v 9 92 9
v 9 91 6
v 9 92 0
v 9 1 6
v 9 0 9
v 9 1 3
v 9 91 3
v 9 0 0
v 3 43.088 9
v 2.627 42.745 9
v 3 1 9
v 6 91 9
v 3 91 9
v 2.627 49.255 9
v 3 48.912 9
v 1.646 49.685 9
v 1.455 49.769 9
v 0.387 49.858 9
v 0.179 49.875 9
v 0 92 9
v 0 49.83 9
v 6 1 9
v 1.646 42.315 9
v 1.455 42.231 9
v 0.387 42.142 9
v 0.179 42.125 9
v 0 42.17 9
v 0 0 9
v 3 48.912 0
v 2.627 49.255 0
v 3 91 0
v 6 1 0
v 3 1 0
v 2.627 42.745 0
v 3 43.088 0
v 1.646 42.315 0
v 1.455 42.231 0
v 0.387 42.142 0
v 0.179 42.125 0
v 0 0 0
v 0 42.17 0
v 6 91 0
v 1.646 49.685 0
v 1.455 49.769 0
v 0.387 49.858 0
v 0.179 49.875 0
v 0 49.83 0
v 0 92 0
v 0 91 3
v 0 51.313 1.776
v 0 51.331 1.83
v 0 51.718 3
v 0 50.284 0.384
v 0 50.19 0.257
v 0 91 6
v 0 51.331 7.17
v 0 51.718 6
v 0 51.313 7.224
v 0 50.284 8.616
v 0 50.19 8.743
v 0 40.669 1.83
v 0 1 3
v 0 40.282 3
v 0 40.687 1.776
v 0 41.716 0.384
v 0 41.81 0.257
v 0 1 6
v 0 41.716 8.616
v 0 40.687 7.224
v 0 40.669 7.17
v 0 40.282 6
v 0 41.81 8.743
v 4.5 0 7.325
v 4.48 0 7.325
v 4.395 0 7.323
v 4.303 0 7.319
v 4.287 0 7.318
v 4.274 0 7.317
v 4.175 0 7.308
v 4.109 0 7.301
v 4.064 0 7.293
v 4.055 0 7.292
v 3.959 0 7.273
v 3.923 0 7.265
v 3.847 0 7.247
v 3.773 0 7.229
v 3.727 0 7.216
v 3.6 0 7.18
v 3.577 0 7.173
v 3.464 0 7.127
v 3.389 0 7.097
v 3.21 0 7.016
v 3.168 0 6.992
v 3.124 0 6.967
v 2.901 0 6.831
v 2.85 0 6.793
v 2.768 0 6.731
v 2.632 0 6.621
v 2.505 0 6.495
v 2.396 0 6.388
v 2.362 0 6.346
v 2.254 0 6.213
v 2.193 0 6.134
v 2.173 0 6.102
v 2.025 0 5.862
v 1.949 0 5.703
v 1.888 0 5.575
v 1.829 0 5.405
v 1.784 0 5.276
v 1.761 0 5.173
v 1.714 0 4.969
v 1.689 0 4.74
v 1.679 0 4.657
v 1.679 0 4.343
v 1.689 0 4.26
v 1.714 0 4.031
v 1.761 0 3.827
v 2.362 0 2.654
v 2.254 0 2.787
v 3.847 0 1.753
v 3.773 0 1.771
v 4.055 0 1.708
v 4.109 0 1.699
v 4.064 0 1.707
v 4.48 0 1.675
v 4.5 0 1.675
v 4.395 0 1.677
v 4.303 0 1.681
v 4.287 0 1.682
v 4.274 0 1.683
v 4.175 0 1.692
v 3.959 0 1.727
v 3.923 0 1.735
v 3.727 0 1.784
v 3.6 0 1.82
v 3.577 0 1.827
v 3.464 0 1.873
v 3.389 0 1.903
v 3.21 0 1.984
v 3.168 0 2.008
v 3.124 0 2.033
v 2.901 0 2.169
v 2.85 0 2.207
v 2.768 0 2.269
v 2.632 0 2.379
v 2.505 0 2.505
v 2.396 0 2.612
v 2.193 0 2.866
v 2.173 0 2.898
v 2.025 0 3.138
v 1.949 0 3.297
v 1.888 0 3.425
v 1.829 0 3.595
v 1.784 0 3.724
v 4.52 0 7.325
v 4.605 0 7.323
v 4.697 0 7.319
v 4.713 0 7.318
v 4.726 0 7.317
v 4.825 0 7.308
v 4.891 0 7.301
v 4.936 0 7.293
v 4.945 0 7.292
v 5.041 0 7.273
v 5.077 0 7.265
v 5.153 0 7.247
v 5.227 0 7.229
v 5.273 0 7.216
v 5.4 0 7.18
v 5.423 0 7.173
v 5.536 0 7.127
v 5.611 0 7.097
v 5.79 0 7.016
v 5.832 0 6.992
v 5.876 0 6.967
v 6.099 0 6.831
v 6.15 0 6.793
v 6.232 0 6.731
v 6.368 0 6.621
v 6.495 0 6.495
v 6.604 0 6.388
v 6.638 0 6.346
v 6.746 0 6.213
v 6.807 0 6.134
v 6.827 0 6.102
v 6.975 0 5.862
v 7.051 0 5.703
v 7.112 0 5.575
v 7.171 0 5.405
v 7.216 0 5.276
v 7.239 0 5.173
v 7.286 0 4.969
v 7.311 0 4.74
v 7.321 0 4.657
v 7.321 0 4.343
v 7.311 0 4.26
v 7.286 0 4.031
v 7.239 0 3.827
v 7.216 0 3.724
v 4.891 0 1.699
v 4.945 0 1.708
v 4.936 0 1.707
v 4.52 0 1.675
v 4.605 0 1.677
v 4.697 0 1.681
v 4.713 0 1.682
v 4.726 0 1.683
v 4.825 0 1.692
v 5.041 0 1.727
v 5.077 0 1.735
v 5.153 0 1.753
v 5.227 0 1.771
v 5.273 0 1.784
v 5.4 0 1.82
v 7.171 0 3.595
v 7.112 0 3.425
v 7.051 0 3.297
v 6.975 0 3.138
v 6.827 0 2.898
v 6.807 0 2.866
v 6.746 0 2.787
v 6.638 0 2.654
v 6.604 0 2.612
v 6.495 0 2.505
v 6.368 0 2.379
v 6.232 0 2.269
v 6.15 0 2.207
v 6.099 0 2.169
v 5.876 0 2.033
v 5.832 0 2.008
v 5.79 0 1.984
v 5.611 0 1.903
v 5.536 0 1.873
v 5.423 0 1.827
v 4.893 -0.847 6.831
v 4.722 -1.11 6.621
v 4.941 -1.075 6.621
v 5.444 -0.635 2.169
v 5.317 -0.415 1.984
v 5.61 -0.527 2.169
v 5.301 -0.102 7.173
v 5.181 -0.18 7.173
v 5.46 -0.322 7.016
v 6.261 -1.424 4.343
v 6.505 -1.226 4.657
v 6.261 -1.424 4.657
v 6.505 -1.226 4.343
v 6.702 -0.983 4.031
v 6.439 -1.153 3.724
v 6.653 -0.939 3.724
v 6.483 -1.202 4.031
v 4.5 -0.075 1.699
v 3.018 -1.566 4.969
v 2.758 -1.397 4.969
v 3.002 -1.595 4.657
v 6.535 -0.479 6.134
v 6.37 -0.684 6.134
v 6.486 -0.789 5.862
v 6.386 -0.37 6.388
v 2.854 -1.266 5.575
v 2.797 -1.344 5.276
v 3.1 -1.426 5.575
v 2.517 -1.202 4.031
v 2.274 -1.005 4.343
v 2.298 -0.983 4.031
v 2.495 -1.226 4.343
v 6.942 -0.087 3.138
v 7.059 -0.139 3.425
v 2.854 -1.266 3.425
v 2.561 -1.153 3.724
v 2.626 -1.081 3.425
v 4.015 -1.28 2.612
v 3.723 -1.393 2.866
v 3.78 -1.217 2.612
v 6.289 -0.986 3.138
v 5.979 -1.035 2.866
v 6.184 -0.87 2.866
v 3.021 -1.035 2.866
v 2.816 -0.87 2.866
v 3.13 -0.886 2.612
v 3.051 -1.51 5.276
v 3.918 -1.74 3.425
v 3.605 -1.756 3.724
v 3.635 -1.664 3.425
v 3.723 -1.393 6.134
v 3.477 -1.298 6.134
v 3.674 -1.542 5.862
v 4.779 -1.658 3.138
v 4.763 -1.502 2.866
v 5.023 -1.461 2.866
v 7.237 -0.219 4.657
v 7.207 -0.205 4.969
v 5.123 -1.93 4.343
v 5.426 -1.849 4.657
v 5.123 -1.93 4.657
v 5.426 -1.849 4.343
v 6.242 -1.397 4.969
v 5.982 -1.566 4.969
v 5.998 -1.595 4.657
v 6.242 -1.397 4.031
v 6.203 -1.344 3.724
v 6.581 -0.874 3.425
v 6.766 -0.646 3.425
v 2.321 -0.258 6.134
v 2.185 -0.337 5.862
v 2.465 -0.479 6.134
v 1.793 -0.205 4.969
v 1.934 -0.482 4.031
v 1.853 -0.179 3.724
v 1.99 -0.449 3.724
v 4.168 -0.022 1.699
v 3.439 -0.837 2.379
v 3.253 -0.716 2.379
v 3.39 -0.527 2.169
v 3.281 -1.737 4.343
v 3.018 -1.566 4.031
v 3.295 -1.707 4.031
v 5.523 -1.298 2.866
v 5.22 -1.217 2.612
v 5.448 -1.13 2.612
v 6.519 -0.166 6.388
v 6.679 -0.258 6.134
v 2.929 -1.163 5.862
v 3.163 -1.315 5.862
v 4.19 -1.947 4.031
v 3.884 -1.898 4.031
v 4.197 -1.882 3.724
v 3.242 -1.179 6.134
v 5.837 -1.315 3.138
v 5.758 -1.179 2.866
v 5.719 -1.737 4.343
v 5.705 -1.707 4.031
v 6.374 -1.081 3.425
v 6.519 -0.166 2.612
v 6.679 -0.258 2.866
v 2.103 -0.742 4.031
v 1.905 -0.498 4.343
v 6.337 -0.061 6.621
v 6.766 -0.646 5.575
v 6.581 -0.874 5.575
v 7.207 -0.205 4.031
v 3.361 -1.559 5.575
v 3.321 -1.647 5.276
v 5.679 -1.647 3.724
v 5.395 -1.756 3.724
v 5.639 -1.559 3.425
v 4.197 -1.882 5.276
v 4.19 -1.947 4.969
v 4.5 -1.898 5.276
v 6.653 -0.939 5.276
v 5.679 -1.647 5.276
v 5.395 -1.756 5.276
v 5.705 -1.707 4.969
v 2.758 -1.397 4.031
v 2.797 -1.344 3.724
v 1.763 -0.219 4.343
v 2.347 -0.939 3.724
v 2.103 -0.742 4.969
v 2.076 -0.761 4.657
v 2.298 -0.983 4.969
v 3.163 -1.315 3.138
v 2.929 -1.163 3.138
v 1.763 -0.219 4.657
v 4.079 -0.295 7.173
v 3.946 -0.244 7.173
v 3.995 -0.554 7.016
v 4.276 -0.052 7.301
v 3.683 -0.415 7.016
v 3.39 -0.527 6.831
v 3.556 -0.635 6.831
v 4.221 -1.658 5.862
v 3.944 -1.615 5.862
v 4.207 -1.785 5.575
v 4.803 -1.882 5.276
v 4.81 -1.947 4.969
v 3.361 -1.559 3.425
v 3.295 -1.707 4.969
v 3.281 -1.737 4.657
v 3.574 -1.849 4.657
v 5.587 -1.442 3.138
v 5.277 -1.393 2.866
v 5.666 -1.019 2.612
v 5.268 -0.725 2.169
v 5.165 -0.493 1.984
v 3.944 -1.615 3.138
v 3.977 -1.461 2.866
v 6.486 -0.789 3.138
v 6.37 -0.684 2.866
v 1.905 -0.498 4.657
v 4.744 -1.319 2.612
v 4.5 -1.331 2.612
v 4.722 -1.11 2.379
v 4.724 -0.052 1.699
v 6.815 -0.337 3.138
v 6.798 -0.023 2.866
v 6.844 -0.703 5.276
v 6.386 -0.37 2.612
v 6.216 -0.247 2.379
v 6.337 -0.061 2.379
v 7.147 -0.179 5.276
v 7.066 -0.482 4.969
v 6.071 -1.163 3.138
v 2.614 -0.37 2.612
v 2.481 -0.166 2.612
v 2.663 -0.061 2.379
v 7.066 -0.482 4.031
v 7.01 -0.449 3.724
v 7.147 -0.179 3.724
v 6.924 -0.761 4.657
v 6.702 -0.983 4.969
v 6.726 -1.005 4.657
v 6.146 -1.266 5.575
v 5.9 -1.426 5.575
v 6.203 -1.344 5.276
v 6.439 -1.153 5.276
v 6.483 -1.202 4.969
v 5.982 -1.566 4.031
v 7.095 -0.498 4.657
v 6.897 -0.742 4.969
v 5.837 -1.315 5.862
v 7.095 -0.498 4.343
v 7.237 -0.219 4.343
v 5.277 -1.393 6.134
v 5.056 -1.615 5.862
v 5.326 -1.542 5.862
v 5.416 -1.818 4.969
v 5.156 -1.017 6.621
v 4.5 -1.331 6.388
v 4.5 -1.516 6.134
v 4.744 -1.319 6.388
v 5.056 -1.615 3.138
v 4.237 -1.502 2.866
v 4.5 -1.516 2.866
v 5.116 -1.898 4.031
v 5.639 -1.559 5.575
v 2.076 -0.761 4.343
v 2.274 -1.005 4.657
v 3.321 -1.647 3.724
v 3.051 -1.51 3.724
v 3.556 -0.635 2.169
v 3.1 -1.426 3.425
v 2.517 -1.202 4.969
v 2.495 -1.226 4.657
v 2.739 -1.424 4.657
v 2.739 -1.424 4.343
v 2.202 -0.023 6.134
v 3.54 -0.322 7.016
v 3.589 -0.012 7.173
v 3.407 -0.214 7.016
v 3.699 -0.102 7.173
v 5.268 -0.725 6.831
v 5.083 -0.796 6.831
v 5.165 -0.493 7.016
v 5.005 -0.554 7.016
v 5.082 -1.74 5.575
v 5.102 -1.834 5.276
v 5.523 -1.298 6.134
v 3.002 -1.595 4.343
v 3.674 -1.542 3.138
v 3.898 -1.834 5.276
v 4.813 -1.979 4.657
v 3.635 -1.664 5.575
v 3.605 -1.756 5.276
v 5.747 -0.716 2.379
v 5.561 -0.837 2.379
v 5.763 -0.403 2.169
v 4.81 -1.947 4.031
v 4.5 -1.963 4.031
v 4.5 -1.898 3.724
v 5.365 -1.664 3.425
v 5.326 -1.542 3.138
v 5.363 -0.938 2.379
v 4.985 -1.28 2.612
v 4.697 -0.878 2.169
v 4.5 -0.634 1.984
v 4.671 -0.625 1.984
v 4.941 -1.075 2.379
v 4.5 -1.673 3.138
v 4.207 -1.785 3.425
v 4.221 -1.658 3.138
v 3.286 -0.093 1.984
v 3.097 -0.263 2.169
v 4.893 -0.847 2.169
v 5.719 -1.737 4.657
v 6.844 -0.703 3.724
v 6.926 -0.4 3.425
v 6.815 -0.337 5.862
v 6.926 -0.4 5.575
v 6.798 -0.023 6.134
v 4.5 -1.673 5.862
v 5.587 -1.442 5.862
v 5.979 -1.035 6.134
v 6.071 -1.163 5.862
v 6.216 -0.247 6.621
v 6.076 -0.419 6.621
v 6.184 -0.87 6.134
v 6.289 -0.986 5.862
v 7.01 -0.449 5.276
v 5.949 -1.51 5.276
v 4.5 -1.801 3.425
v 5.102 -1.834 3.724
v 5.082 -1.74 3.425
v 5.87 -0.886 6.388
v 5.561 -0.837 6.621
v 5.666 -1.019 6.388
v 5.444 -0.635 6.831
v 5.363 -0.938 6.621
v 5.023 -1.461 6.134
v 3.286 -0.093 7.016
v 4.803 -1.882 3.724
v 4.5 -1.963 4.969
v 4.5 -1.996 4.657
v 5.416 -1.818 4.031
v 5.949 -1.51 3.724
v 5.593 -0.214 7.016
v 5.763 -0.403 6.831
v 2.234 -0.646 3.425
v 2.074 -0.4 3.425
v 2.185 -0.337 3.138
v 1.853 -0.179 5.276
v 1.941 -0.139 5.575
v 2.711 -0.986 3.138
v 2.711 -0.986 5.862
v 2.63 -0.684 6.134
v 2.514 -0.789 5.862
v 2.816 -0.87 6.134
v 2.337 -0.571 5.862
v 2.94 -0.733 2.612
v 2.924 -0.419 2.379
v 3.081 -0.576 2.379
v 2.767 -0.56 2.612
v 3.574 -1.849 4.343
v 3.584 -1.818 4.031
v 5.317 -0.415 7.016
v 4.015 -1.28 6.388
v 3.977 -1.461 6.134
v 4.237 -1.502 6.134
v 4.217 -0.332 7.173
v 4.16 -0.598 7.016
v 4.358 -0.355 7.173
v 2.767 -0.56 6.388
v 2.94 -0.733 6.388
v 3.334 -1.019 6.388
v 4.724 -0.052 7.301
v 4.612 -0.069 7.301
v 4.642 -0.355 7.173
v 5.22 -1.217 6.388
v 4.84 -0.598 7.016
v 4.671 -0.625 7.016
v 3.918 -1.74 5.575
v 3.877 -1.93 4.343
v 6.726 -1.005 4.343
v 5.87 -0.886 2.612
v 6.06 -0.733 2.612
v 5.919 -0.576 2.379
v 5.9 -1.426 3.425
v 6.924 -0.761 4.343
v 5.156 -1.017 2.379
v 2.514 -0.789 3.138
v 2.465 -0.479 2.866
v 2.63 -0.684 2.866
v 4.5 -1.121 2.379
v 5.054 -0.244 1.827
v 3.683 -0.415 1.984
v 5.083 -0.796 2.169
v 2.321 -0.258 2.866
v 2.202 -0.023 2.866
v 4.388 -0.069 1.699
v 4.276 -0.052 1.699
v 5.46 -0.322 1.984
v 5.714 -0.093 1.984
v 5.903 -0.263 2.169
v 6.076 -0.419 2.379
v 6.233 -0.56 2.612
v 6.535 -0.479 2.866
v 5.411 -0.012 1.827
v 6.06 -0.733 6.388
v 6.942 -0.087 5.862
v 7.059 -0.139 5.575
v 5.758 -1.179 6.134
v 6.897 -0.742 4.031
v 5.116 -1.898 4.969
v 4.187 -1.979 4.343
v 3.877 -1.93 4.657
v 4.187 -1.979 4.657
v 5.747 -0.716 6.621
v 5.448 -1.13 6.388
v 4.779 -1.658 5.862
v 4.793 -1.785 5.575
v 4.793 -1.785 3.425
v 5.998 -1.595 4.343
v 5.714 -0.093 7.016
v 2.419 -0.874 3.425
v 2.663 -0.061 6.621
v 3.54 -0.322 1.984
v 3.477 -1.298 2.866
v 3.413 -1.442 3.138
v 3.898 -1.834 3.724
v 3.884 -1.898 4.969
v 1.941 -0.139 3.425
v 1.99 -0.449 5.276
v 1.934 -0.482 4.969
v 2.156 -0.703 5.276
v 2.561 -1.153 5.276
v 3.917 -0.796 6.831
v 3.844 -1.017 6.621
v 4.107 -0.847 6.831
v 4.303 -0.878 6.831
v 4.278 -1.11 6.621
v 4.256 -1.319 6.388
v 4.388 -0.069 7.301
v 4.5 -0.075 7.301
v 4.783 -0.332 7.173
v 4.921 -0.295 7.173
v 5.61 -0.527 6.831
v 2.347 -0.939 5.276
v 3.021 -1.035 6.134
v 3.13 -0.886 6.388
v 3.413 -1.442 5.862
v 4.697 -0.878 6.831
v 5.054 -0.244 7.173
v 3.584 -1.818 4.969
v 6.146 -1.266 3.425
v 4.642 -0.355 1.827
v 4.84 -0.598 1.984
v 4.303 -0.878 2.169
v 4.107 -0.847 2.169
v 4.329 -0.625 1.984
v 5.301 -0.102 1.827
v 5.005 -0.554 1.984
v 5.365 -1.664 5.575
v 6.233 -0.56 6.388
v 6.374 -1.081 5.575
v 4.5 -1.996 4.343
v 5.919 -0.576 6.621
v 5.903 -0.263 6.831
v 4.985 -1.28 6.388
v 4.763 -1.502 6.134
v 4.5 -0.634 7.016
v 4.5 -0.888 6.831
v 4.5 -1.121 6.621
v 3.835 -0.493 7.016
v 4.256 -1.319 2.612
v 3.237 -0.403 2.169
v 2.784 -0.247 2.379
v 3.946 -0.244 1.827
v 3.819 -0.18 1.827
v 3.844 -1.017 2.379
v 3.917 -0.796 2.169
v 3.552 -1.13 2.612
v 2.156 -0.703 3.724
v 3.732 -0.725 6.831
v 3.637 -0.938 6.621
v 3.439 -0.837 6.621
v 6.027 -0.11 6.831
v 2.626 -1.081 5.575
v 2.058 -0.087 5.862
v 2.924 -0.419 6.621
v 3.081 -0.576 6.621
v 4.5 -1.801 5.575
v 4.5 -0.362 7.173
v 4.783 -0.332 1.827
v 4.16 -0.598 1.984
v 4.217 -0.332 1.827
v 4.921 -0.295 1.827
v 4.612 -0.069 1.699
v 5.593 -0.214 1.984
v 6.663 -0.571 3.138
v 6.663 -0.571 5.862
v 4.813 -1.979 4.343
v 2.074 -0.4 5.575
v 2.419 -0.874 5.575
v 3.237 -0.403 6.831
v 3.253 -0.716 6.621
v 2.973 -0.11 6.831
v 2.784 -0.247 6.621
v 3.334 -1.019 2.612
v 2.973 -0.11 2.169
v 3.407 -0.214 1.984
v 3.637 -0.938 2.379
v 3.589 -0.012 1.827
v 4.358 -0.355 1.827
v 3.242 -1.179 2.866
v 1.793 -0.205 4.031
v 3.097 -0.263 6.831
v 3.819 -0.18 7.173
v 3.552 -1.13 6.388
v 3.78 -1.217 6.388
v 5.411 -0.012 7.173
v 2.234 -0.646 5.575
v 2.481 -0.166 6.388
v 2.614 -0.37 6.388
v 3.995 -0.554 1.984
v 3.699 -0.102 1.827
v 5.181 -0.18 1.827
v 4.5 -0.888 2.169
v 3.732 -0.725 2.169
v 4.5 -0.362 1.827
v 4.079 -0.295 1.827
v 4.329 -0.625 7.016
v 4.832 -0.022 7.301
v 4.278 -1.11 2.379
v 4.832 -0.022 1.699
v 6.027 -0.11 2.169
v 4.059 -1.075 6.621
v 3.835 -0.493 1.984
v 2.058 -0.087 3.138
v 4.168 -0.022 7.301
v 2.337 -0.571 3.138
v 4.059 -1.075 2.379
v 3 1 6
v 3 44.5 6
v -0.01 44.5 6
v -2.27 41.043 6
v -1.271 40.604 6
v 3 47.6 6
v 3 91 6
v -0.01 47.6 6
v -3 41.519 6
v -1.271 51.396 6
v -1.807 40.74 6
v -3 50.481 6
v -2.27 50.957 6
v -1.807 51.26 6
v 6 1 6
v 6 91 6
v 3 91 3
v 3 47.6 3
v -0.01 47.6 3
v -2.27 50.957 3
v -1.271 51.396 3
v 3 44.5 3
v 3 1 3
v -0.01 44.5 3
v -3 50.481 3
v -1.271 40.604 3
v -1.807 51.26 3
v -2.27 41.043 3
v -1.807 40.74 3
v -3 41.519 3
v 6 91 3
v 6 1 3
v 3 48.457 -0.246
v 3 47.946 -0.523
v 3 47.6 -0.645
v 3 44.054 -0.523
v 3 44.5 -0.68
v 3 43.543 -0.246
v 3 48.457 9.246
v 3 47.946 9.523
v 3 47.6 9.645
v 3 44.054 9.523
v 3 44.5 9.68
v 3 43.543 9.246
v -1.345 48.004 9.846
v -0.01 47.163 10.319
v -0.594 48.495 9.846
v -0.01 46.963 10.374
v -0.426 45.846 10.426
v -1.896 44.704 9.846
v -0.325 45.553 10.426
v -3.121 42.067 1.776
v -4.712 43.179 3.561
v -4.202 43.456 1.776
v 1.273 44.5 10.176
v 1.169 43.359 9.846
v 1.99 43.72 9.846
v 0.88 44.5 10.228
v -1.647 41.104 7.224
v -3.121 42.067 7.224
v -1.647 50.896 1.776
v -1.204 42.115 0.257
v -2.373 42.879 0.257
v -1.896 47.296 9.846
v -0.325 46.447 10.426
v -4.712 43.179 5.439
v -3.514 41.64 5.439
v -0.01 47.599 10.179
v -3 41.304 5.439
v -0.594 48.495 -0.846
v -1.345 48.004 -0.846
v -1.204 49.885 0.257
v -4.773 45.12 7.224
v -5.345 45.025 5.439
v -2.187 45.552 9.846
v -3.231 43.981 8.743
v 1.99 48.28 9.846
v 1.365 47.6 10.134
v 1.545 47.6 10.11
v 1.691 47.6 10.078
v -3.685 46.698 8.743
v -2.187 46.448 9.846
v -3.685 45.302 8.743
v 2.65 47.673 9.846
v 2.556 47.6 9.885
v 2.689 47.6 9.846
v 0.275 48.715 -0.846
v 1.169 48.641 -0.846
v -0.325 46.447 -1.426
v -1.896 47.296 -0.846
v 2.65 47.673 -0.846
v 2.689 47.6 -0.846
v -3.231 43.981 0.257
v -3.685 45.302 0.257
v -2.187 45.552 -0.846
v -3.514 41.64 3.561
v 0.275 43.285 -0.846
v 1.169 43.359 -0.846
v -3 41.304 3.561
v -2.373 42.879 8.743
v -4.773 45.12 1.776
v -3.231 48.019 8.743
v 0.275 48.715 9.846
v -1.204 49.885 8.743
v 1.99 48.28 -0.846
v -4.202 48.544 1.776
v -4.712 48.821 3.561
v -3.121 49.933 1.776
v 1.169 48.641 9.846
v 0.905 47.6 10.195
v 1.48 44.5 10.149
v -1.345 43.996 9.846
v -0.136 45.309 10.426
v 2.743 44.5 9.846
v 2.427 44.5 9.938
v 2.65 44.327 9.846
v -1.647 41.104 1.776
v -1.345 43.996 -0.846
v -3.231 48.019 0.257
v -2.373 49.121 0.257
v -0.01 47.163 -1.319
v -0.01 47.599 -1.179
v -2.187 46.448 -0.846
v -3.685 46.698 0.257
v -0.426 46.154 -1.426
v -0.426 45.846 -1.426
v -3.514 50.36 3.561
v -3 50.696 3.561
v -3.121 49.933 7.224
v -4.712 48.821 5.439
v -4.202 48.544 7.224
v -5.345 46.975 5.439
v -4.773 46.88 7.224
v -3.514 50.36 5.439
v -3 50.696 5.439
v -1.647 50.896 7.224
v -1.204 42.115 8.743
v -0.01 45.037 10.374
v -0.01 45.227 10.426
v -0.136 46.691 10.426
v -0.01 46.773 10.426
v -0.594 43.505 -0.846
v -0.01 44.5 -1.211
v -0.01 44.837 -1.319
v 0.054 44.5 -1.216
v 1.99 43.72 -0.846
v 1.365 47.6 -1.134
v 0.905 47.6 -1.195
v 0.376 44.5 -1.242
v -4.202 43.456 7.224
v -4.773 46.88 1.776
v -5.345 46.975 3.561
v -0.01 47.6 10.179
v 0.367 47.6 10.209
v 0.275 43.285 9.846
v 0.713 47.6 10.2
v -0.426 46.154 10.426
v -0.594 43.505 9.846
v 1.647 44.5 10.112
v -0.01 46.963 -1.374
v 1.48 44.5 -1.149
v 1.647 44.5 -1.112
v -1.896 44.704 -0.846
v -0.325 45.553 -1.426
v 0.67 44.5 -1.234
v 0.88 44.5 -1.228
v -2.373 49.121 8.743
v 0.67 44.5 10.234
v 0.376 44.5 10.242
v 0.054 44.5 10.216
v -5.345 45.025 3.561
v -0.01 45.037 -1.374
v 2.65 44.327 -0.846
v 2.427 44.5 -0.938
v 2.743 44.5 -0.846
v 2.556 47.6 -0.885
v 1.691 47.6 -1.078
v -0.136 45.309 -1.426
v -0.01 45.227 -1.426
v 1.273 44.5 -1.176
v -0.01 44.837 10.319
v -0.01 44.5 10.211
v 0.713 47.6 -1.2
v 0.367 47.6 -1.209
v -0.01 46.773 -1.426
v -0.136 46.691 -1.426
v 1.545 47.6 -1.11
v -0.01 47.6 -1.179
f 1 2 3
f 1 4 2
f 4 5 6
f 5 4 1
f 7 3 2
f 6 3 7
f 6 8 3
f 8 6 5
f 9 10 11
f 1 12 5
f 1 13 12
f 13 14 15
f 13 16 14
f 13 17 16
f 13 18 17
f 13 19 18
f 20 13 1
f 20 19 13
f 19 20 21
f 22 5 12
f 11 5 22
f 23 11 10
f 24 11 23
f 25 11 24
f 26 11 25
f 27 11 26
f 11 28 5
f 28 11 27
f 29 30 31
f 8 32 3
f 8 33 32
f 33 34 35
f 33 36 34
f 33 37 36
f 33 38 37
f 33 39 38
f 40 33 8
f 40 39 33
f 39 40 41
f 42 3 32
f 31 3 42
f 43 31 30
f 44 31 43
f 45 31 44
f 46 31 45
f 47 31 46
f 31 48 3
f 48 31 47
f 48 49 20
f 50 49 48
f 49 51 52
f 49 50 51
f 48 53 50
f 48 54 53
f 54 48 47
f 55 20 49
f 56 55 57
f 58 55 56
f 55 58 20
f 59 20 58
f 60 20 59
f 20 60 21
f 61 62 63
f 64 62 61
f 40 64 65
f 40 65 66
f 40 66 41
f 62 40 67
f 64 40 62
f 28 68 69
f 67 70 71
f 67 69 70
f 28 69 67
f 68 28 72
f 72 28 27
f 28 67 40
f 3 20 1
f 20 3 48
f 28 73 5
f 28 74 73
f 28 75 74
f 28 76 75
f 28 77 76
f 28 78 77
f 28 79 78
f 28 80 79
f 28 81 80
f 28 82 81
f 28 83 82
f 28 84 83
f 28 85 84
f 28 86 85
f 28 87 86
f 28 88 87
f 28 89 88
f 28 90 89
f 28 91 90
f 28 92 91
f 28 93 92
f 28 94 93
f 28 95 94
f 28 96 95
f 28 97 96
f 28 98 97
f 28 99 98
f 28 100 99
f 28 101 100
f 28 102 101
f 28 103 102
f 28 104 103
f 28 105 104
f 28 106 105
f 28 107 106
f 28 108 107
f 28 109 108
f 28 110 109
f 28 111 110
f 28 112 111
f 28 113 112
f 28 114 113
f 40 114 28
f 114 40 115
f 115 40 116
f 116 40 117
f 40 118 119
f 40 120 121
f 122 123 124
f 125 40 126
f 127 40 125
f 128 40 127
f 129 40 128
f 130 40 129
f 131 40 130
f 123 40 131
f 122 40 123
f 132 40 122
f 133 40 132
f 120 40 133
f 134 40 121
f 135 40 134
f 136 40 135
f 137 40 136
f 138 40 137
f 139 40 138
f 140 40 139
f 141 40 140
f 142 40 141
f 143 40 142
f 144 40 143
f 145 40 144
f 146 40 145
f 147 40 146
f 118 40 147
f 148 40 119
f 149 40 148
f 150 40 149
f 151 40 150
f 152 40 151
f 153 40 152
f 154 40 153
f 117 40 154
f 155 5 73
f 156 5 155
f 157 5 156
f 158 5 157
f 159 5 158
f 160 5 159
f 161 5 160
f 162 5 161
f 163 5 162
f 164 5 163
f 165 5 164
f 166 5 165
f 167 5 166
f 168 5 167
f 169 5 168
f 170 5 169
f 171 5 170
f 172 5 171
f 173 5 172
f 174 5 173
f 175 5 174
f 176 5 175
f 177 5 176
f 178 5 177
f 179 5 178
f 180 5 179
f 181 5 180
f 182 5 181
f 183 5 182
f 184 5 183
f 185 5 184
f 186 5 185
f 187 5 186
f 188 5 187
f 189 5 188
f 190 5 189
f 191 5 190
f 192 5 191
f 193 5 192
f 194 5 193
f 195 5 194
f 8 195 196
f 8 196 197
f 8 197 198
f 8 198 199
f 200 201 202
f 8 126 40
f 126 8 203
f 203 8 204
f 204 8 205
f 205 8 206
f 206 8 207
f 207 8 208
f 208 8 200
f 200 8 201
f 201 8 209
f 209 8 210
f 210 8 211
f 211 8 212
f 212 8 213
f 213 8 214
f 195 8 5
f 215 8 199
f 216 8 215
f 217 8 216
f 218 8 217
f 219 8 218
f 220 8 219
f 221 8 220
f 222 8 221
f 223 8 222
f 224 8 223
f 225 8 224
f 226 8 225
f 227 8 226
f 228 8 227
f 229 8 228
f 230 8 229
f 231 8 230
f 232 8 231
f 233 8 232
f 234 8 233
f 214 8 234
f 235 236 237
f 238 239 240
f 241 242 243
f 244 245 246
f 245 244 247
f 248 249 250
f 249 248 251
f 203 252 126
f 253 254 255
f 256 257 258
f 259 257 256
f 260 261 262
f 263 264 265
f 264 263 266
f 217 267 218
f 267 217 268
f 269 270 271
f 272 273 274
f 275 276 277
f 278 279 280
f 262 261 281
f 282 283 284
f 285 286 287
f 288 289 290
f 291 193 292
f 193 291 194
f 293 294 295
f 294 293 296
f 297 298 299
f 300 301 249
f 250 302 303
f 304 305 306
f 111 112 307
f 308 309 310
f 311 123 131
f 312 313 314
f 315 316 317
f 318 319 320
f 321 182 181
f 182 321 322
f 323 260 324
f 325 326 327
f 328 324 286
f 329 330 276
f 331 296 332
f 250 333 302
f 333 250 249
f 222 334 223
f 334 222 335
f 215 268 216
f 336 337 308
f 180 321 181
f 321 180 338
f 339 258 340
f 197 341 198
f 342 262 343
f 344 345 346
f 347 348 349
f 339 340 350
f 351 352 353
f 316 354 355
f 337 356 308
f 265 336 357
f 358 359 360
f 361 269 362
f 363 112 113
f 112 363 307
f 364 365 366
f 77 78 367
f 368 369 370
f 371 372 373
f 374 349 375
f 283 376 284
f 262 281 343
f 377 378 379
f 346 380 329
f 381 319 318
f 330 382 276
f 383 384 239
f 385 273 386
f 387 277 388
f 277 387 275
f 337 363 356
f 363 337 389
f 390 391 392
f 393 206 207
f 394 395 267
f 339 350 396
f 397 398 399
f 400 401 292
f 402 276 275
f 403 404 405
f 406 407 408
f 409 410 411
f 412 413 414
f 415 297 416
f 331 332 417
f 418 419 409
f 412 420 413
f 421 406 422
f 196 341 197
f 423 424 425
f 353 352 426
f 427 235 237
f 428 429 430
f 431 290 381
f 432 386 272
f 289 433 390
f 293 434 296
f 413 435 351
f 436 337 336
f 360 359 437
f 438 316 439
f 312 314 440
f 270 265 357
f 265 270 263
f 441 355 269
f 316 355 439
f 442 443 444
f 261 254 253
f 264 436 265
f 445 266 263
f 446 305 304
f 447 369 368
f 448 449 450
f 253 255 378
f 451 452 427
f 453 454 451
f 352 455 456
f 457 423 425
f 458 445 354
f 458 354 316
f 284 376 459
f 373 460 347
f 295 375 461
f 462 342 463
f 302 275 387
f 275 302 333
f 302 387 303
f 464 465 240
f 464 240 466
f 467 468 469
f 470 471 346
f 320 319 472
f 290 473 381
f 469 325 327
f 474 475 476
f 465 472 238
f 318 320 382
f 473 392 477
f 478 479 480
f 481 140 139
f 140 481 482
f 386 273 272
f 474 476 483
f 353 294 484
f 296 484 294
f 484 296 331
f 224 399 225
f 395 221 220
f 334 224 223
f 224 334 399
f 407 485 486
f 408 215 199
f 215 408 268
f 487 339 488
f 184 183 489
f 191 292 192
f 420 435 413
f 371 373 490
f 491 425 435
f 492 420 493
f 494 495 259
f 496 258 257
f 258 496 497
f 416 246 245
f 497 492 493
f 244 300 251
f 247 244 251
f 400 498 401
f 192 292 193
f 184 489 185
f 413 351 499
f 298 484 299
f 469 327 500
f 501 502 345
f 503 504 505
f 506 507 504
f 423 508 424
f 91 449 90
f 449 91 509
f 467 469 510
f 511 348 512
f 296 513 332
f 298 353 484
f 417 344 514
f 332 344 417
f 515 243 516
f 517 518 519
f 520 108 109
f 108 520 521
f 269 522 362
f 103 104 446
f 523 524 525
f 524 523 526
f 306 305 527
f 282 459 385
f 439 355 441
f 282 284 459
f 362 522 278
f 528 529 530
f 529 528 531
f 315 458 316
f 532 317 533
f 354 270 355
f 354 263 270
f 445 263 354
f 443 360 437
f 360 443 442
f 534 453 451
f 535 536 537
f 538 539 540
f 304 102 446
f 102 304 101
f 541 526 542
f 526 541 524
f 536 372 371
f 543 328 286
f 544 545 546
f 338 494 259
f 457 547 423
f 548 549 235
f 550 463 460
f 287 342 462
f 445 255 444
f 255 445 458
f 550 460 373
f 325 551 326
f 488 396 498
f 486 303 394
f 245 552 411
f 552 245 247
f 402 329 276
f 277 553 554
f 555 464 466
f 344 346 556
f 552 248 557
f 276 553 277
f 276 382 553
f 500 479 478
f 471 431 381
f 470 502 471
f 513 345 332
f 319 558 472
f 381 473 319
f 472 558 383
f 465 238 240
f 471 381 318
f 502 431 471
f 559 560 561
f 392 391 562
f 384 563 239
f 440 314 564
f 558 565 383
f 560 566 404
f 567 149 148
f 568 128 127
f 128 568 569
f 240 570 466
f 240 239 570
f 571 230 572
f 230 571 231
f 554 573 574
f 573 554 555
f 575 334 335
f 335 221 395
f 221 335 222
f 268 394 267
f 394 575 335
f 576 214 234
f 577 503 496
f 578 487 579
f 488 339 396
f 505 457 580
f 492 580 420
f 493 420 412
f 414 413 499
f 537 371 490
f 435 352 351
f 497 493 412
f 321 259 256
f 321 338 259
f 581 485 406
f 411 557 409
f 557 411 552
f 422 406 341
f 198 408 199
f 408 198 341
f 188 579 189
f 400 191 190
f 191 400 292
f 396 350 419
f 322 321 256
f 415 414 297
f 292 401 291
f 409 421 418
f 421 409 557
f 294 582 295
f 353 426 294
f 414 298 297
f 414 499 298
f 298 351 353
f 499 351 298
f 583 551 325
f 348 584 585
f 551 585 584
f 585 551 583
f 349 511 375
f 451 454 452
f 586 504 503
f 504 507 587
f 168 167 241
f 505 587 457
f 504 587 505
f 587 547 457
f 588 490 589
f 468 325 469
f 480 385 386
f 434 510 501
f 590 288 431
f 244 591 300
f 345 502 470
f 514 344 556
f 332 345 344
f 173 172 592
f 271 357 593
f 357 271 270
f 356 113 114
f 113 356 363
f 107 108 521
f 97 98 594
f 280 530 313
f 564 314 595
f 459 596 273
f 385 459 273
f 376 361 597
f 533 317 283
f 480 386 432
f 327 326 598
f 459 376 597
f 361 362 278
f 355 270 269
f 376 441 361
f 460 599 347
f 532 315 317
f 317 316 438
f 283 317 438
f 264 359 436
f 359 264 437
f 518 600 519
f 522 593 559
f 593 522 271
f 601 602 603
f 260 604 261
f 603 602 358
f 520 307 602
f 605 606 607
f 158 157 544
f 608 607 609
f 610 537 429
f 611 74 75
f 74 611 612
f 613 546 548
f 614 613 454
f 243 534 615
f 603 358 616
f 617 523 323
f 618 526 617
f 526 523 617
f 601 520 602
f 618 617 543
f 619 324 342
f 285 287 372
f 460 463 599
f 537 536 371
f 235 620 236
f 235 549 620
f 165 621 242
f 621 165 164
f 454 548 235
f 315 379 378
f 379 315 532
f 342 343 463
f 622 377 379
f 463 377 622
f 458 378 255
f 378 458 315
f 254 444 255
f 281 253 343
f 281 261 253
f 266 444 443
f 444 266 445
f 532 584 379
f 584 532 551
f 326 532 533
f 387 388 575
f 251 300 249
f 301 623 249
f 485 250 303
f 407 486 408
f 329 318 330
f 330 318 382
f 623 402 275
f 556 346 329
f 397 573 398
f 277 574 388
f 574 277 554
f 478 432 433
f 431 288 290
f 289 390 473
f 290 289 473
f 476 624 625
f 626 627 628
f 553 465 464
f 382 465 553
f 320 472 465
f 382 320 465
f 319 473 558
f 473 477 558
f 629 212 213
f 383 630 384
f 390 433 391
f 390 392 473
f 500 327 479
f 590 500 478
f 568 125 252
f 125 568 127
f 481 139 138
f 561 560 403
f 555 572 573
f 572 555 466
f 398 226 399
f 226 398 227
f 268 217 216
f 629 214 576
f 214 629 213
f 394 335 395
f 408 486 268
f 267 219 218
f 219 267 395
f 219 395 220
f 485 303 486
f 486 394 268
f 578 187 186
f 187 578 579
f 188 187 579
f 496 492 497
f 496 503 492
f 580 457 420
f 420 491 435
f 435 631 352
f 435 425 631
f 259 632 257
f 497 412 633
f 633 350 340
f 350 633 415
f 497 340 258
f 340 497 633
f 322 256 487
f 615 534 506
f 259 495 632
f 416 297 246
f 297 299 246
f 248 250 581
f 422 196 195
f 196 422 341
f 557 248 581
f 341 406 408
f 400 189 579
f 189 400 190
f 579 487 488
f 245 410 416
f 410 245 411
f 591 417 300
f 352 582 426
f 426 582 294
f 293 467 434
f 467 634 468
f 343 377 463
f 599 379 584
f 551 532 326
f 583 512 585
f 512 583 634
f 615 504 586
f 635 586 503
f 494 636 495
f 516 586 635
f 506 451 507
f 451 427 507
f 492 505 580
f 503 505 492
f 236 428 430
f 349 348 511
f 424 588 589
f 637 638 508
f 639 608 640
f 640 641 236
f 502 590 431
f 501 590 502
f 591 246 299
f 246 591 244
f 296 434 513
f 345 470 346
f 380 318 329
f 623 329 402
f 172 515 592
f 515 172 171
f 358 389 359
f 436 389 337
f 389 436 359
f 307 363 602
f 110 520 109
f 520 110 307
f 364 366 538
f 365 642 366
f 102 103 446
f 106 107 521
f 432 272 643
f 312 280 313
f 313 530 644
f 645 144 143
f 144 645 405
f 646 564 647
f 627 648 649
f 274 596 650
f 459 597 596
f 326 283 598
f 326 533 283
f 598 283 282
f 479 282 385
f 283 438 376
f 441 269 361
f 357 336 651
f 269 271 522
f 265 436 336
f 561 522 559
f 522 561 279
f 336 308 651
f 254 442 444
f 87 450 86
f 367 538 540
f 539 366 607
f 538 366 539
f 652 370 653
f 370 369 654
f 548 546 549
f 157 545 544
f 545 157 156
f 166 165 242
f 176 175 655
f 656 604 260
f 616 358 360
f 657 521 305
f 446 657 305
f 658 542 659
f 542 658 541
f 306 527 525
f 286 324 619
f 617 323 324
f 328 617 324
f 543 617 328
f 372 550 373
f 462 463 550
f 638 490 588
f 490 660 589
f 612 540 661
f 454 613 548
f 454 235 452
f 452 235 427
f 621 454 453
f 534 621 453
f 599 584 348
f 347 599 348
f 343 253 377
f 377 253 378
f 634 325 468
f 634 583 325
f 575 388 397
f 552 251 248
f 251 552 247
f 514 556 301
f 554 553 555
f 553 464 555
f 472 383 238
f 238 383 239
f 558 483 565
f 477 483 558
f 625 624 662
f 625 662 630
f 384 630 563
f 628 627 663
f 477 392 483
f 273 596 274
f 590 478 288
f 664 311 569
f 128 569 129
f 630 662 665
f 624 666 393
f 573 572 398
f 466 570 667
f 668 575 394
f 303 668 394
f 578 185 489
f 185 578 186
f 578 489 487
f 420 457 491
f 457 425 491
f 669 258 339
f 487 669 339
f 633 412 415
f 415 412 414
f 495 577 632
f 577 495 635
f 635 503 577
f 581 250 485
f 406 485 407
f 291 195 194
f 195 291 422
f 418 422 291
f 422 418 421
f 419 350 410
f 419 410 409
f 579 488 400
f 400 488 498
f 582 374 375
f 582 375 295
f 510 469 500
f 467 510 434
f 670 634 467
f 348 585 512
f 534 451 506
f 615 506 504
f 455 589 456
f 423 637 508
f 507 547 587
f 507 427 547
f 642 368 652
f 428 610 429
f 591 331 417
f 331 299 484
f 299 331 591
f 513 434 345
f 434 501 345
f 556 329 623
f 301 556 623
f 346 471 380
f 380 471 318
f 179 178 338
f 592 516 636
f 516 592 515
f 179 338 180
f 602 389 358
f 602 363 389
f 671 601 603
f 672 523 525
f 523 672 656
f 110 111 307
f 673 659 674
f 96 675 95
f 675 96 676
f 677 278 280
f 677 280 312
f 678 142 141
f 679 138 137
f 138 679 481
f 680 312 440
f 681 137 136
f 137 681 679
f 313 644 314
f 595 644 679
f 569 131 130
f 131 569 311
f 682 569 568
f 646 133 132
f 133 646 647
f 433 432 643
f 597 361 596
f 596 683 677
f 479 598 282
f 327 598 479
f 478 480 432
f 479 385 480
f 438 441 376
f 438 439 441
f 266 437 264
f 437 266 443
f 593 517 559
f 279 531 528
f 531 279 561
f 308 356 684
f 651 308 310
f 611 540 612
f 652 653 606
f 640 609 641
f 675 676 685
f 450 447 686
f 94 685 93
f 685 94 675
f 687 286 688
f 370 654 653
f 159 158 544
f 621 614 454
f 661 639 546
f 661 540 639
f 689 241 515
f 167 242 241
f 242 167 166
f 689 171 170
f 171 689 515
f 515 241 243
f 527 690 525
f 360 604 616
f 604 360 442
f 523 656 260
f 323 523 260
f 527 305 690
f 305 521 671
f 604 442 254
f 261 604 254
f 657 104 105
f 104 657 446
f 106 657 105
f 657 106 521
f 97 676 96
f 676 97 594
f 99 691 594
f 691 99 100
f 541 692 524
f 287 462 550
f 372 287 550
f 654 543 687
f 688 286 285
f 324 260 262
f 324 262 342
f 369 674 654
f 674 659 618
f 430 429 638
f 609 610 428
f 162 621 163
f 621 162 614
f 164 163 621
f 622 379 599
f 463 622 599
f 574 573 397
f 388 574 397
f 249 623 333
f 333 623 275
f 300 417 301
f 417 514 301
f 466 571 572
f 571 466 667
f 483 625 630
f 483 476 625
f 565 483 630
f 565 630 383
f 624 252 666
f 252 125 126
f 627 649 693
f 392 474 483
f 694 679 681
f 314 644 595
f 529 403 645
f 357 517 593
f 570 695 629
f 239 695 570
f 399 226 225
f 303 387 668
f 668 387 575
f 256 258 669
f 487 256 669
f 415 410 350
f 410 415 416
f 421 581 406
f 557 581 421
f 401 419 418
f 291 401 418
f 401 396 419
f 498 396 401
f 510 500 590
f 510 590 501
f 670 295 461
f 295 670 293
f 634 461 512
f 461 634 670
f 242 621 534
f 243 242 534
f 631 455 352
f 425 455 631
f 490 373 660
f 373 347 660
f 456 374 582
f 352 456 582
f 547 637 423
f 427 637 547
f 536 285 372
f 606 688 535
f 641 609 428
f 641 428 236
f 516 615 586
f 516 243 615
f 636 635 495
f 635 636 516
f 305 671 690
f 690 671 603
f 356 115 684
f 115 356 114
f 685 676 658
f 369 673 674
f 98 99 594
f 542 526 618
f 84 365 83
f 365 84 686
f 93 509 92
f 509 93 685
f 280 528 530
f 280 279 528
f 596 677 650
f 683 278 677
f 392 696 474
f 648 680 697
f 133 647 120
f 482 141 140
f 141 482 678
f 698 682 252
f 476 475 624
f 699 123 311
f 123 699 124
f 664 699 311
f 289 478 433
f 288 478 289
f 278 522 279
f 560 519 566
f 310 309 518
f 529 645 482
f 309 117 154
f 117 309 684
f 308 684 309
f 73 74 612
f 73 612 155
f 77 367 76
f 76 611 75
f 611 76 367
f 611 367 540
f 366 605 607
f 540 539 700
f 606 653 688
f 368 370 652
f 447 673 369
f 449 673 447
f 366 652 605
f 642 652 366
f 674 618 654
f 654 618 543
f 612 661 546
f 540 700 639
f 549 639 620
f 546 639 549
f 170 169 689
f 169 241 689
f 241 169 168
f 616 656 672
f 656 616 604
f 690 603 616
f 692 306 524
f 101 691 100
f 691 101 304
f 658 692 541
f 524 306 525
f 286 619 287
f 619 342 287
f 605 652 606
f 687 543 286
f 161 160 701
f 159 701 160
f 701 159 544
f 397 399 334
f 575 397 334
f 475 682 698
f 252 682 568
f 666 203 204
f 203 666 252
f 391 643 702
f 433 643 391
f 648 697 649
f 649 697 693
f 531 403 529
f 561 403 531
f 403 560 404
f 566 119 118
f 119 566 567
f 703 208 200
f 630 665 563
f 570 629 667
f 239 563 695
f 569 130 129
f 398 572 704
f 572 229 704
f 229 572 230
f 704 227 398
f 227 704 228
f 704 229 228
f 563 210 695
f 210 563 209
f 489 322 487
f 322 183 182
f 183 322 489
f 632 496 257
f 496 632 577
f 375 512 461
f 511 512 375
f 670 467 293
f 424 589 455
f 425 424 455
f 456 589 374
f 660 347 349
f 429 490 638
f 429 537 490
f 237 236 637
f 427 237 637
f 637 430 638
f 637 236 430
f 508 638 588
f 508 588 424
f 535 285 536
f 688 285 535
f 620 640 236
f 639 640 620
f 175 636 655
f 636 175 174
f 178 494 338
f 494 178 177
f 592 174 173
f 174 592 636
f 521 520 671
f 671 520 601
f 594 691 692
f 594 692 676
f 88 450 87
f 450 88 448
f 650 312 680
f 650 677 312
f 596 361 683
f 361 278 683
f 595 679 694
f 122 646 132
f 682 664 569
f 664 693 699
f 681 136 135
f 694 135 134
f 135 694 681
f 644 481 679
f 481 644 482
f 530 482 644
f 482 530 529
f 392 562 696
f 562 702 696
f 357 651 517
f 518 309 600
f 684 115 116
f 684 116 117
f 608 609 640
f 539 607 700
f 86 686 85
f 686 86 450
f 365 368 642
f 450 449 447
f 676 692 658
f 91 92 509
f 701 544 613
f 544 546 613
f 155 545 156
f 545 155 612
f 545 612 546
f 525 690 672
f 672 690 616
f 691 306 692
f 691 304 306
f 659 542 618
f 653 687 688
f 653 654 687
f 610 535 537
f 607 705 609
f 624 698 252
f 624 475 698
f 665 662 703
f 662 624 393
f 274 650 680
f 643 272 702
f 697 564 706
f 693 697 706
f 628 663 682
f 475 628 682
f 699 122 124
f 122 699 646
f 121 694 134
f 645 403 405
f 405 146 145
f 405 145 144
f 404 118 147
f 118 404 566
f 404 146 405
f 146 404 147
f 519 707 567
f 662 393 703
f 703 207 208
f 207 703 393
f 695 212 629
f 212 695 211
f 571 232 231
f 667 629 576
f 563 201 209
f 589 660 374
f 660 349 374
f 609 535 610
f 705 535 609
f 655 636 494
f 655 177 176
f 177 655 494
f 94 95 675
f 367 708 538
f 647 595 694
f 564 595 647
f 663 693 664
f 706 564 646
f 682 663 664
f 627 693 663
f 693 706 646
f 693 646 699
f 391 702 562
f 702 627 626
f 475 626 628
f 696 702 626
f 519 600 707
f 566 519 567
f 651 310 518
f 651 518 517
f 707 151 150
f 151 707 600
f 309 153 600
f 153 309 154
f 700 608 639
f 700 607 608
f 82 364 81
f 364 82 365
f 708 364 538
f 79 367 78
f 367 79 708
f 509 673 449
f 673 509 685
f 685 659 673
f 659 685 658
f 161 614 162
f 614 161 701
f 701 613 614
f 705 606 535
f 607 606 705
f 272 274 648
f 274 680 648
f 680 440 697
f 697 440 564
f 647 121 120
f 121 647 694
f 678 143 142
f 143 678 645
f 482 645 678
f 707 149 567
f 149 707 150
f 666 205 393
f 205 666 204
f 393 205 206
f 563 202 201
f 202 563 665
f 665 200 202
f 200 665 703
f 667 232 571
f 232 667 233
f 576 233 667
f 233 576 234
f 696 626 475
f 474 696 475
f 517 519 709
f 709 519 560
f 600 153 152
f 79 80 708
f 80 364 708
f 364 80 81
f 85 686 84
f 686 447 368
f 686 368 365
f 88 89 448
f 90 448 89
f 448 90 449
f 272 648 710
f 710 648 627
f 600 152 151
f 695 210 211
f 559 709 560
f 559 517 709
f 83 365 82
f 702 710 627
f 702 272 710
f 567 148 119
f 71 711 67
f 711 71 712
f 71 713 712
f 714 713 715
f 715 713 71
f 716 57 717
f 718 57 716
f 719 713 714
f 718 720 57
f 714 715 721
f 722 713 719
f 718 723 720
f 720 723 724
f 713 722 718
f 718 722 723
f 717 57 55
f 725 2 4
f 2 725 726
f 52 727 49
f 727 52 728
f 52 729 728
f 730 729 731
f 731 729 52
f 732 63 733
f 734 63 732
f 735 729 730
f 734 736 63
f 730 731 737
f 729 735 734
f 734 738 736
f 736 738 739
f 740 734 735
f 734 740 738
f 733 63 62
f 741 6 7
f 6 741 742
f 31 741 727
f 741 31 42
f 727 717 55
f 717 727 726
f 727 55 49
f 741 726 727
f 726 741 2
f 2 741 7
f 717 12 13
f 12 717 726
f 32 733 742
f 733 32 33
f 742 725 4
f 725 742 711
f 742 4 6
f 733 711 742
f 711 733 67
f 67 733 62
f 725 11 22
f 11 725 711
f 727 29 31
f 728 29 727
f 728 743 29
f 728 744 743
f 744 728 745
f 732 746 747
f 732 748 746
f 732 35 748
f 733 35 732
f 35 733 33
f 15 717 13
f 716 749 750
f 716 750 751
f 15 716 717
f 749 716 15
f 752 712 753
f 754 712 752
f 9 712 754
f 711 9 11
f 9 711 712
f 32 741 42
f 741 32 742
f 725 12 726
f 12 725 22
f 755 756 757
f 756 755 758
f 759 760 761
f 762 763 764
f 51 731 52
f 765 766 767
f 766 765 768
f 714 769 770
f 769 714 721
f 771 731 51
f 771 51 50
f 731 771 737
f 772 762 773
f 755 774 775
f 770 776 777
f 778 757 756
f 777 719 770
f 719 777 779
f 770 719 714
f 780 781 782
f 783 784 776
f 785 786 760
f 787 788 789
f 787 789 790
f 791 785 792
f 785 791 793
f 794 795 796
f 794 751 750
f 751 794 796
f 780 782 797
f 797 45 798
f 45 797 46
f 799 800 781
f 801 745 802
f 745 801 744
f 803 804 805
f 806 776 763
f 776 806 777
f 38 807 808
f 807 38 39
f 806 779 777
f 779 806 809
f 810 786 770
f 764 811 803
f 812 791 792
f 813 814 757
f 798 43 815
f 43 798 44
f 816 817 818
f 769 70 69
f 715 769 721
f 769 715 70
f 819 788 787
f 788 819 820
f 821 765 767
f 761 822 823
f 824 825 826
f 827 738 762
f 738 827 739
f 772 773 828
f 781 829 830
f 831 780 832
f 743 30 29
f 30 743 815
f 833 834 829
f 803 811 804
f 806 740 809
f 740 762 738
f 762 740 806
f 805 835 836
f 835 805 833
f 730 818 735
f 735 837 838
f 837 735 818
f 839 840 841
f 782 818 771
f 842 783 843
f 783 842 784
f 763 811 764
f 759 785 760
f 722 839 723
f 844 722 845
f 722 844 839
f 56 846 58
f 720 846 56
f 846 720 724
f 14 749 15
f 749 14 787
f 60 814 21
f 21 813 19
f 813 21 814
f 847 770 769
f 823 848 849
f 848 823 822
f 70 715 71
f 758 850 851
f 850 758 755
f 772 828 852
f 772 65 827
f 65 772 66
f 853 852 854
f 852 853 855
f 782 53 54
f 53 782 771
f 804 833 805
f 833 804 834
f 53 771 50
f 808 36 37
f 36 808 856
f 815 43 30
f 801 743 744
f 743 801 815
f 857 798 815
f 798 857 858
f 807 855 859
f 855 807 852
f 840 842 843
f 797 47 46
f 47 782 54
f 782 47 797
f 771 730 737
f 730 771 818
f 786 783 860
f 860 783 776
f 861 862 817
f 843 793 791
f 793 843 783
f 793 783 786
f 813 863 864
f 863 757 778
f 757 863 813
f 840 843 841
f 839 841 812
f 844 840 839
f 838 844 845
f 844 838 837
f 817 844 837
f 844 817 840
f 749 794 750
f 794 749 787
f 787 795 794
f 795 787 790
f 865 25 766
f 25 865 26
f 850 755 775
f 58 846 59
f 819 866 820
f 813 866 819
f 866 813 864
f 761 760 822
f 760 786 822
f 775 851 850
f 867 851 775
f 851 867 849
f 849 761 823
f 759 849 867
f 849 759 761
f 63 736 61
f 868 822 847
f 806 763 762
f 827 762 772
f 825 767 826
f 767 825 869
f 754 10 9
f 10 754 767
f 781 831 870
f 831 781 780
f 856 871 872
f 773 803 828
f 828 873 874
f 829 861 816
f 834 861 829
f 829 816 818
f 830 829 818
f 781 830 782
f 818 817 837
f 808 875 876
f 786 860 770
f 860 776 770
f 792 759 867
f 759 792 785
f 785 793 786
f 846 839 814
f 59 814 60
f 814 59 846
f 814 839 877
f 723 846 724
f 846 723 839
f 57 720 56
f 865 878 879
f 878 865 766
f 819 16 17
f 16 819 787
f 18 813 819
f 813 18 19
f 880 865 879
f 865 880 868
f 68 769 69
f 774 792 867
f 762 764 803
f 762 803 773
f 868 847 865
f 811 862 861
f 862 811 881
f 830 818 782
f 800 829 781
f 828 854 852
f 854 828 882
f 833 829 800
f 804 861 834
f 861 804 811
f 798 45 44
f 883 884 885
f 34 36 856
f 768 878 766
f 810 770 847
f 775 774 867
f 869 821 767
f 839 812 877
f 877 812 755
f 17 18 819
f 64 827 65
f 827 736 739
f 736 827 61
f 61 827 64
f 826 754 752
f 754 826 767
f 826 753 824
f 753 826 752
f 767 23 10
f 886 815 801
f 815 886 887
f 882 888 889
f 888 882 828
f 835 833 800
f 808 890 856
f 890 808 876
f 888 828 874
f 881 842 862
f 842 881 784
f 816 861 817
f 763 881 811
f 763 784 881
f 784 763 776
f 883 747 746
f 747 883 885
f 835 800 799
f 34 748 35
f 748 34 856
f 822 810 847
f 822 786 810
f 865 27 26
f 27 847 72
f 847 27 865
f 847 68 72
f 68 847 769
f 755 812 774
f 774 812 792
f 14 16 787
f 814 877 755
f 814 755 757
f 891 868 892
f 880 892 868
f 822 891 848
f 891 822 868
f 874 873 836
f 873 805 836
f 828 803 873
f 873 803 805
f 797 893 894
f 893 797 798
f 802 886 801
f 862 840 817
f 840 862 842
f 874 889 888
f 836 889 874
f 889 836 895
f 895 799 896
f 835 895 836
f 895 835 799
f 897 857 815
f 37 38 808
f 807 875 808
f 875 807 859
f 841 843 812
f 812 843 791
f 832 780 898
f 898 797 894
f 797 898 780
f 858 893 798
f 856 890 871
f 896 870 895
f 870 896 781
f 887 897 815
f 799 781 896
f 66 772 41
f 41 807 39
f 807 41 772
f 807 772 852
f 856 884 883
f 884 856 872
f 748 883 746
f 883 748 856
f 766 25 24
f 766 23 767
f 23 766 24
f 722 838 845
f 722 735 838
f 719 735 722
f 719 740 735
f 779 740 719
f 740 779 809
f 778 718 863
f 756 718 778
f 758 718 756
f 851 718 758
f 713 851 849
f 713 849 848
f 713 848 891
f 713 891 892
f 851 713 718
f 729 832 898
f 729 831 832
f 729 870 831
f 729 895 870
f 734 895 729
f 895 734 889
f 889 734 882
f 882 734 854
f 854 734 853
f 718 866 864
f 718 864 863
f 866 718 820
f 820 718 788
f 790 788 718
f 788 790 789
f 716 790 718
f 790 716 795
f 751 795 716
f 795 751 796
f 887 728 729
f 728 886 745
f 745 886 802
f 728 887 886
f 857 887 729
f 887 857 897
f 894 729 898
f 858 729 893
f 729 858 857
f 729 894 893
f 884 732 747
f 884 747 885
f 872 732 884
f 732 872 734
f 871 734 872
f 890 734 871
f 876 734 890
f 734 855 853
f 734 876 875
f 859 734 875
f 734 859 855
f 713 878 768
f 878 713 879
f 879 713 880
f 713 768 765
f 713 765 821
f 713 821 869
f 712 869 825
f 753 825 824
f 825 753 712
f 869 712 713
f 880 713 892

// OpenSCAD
jarwidth=90;
jarbottomwidth=60;
jarheight=70;
mdfwidth=3;
spiel=2;
schlitzwidth=30;

module jar(){
    color("beige",.7)
    translate([jarwidth/2,jarwidth/2])
    cylinder($fn=20,h=jarheight, r1=jarbottomwidth/2, r2=jarwidth/2);
}

module jarrow(){
    for (i=[0:3]){
        translate([i*2*jarwidth+i*mdfwidth,0,0])
            jar();
        translate([i*2*jarwidth+i*mdfwidth+jarwidth,0,0])
            jar();
    }
}

module brett(length){   
    color("#aa8800")
    square([length,jarwidth]);
}

module hbrett(length){
//    linear_extrude(mdfwidth)
        brett(length);
}

module hbrett_long_left(){
//    linear_extrude(mdfwidth)
    union(){
        difference(){    
            brett(4*jarwidth+mdfwidth); 
            translate([jarwidth*2,10])    
                square([mdfwidth,schlitzwidth]); 
            translate([jarwidth*2,jarwidth-10-schlitzwidth])       
                square([mdfwidth,schlitzwidth]);
        }
        translate([-mdfwidth,jarwidth/2-schlitzwidth/2])
            square([mdfwidth,schlitzwidth]);  
       translate([0,schlitzwidth/2-1.5*mdfwidth]){
        difference(){
            translate([-2*mdfwidth,jarwidth/2-schlitzwidth/2])
                square([mdfwidth,3*mdfwidth]);   
            translate([-2*mdfwidth,jarwidth/2-schlitzwidth/2+mdfwidth])
                square([mdfwidth,mdfwidth]);       
        }
        translate([-3*mdfwidth,jarwidth/2-schlitzwidth/2])
            square([mdfwidth,3*mdfwidth]); 
       }    
//        
        translate([4*jarwidth+mdfwidth,0])
            square([mdfwidth,schlitzwidth/2]); 
        translate([4*jarwidth+mdfwidth,jarwidth-schlitzwidth/2])
            square([mdfwidth,schlitzwidth/2]);  
    }
}


module hbrett_long_right(){
//    linear_extrude(mdfwidth)
    union(){
        difference(){    
            brett(4*jarwidth+mdfwidth); 
            translate([jarwidth*2,10])    
                square([mdfwidth,schlitzwidth]); 
            translate([jarwidth*2,jarwidth-10-schlitzwidth])       
                square([mdfwidth,schlitzwidth]);
        }
        translate([4*jarwidth+mdfwidth,jarwidth/2-schlitzwidth/2])
            square([mdfwidth,schlitzwidth]); 
        translate([-mdfwidth,jarwidth/2+schlitzwidth/2])
            square([mdfwidth,schlitzwidth/2]); 
        translate([-mdfwidth,schlitzwidth/2])
            square([mdfwidth,schlitzwidth/2]);        
//        
   translate([0,schlitzwidth/2-1.5*mdfwidth]){
        difference(){
            translate([4*jarwidth+2*mdfwidth,jarwidth/2-schlitzwidth/2])
                square([mdfwidth,3*mdfwidth]);   
            translate([4*jarwidth+2*mdfwidth,jarwidth/2-schlitzwidth/2+mdfwidth])
                square([mdfwidth,mdfwidth]);       
        }
        translate([4*jarwidth+3*mdfwidth,jarwidth/2-schlitzwidth/2])
            square([mdfwidth,3*mdfwidth]); 
       }  
    }
}


module hbrett_kurz(){
//    linear_extrude(mdfwidth)
    union(){    
        brett(2*jarwidth); 
        translate([2*jarwidth,jarwidth/2-schlitzwidth/2])
            square([mdfwidth,schlitzwidth]);
        translate([-mdfwidth,jarwidth/2-schlitzwidth/2])
            square([mdfwidth,schlitzwidth]);
        translate([0,schlitzwidth/2-1.5*mdfwidth]){
            difference(){
                translate([-2*mdfwidth,jarwidth/2-schlitzwidth/2])
                    square([mdfwidth,3*mdfwidth]);   
                translate([-2*mdfwidth,jarwidth/2-schlitzwidth/2+mdfwidth])
                    square([mdfwidth,mdfwidth]);       
            }
            translate([-3*mdfwidth,jarwidth/2-schlitzwidth/2])
                square([mdfwidth,3*mdfwidth]); 
           }  
        }    
}
    
module hbrett_middle(){
//    linear_extrude(mdfwidth)
    union(){
        difference(){    
            brett(4*jarwidth+mdfwidth); 
            translate([jarwidth*2,jarwidth/2-schlitzwidth/2])    
                square([mdfwidth,schlitzwidth]);  
            }
            translate([-mdfwidth,0])
                square([mdfwidth,schlitzwidth/2]); 
            translate([-mdfwidth,jarwidth-schlitzwidth/2])
                square([mdfwidth,schlitzwidth/2]); 
            translate([4*jarwidth+mdfwidth,0])
                square([mdfwidth,schlitzwidth/2]); 
            translate([4*jarwidth+mdfwidth,jarwidth-schlitzwidth/2])
                square([mdfwidth,schlitzwidth/2]);          
        }
}


module vbrett_aussen(){   
color("yellow",.2)    
//rotate([0,-90,0])
//linear_extrude(mdfwidth)
    difference(){    
    brett(5*jarheight+2*mdfwidth+2*spiel); 
    translate([jarheight*2+spiel,jarwidth/2-schlitzwidth/2])    
        square([mdfwidth,schlitzwidth]);
    translate([jarheight*4+spiel*2+mdfwidth,jarwidth/2-schlitzwidth/2])    
        square([mdfwidth,schlitzwidth]);
    }
}


module vbrett_mitte(){   
//rotate([0,-90,0])
//linear_extrude(mdfwidth)
    difference(){   
    brett(4*jarheight+2*mdfwidth+2*spiel);
//    translate([jarheight*2+spiel,jarwidth/2-schlitzwidth/2])    
//        square([mdfwidth,schlitzwidth]);
//    translate([jarheight*4+spiel*2+mdfwidth,0])    
//        square([mdfwidth,schlitzwidth]);
//    translate([jarheight*4+spiel*2+mdfwidth,jarwidth-schlitzwidth])    
//        square([mdfwidth,schlitzwidth]);
    translate([jarheight*2+spiel,0])    
        square([mdfwidth,schlitzwidth]);
    translate([jarheight*2+spiel,jarwidth-schlitzwidth])    
        square([mdfwidth,schlitzwidth]);
    translate([jarheight*4+spiel*2+mdfwidth,0])    
        square([mdfwidth,schlitzwidth]);
    translate([jarheight*4+spiel*2+mdfwidth,jarwidth-schlitzwidth])    
        square([mdfwidth,schlitzwidth]);
    }
}


module vbrett_innen(){   
//rotate([0,-90,0])
//linear_extrude(mdfwidth)
    brett(jarheight*2+spiel);
}


module vbrett_innen_bottom(){   
//rotate([0,-90,0])
//linear_extrude(mdfwidth)
    union(){
        brett(jarheight*2+spiel);
        translate([jarheight*2+spiel,10])
            square([mdfwidth,schlitzwidth]);
    }
}

module vbrett_innen_mitte(){   
//rotate([0,-90,0])
//linear_extrude(mdfwidth)
    union(){
        brett(jarheight*2+spiel);
        translate([-mdfwidth,jarwidth/2+schlitzwidth/2-10])
            square([mdfwidth,schlitzwidth]);
        translate([jarheight*2+spiel,jarwidth/2+schlitzwidth/2])
            square([mdfwidth,schlitzwidth/2]);   
        translate([jarheight*2+spiel,schlitzwidth/2])
            square([mdfwidth,schlitzwidth/2]);        
    }    
}



module joint(){
    color("white")
        difference(){
                union(){
                        cube([mdfwidth*3,jarwidth+2,mdfwidth*3]); 
                    translate([4.5,1,4.5])
                sphere(3,$fn=60);
                    }
                translate([-10,1,mdfwidth])
                cube([100,jarwidth,mdfwidth]);
                translate([mdfwidth*2,1,-10])
                rotate([0,-90,0])
                cube([100,jarwidth,mdfwidth]);
    }
}


module joint2(){
    color("white")
    difference(){
        union(){
            joint();
            translate([0.5,jarwidth/2+1,1.5*mdfwidth])
                sphere(6,center=true);
        }
        translate([-mdfwidth,1,mdfwidth])
            cube([100,jarwidth,mdfwidth]);
        translate([-.01,jarwidth/2-.5,-5])
            cube([mdfwidth+.1,mdfwidth+.1,20]);
        translate([mdfwidth*2,1,-10])
                rotate([0,-90,0])
                cube([100,jarwidth,mdfwidth]);
    }
}


module spiess(){
//    translate([0,mdfwidth,0])
//    rotate([90,0,0])
//    linear_extrude(mdfwidth){
        square([mdfwidth,5*jarheight+2*mdfwidth+2*spiel]);
//        }
}
    
joint2();



//translate([0,0,0])    
//    jarrow();
//translate([0,0,1*jarheight])    
//    jarrow();
//translate([0,0,2*jarheight+mdfwidth+spiel])    
//    jarrow();
//translate([0,0,3*jarheight+mdfwidth+spiel])    
//    jarrow(); 
//translate([0,0,4*jarheight+mdfwidth*2+spiel*2])    
//    jarrow();
// 
//translate([4*jarwidth+mdfwidth,0,0])
//{
//translate([0,0,0])    
//    jarrow();
//translate([0,0,1*jarheight])    
//    jarrow();
//translate([0,0,2*jarheight+mdfwidth+spiel])    
//    jarrow();
//translate([0,0,3*jarheight+mdfwidth+spiel])    
//    jarrow(); 
//translate([0,0,4*jarheight+mdfwidth*2+spiel*2])    
//    jarrow();
//}


//color("black")
//translate([-2*mdfwidth,jarwidth/2-mdfwidth/2,0])
//spiess();
//
//color("yellow",.6)
//translate([0,0])
//vbrett_aussen();
//
//color("grey")
//translate([0,0,2*jarheight+spiel])
//    hbrett_long_left();
//
//color("pink")    
//translate([0,0,4*jarheight+spiel*2+mdfwidth])
//    hbrett_kurz();
//    
//color("brown")    
//translate([2*jarwidth+mdfwidth,0,4*jarheight+spiel*2+mdfwidth])
//    hbrett_middle();
//
//color("red")    
//translate([2*jarwidth+mdfwidth,0,0])    
//vbrett_innen_bottom();
//
//color("green")    
//translate([2*jarwidth+mdfwidth,0,jarheight*2+spiel+mdfwidth])    
//vbrett_innen_mitte();
//
//
//translate([mdfwidth+4*jarwidth+mdfwidth,0,0])    
//vbrett_mitte();
//
//color("grey")
//translate([4*jarwidth+2*mdfwidth,0,2*jarheight+spiel])
//    hbrett_long_right();
//
//color("pink")    
//translate([6*jarwidth+3*mdfwidth,0,4*jarheight+spiel*2+mdfwidth])
//    hbrett_kurz(2*jarwidth);
////    
//color("brown")    
//translate([2*jarwidth,0,4*jarheight+spiel*2+mdfwidth])
//    hbrett(4*jarwidth);
//
//
//color("red")    
//translate([mdfwidth*2+6*jarwidth+mdfwidth,0,0])    
//vbrett_innen_bottom();
//
//color("green")    
//translate([mdfwidth*2+6*jarwidth+mdfwidth,0,jarheight*2+spiel+mdfwidth])    
//vbrett_innen_mitte();
//
//
//translate([8*jarwidth+4*mdfwidth,0,0])  
//vbrett_aussen();
//
//for(i=[0:4]){
//    translate([-2*mdfwidth+2*i*jarwidth+i*mdfwidth,-1,2*jarheight-1])
//    joint2();
//    translate([-2*mdfwidth+2*i*jarwidth+i*mdfwidth,-1,4*jarheight+mdfwidth+spiel-1])
//    joint();  
//} 


//420 * 295

//translate([0,0])
//    vbrett_aussen();
//translate([0,91])
//    vbrett_aussen();
//translate([3,182])
//    hbrett_middle(); 
//translate([0,275.1])
//rotate([0,0,-90])     
//    spiess();
//translate([0,278])
//rotate([0,0,-90])     
//    spiess();  
    
//translate([mdfwidth,400]){
//    translate([0,0])
//        hbrett_long_right();
//    translate([mdfwidth*2,91])
//        hbrett_long_left();
//    translate([-mdfwidth,182])
//        vbrett_mitte();  
//}    
//    
//translate([mdfwidth,800]){
//    translate([90,0])
//        rotate([0,0,90])
//            vbrett_innen_mitte();
//    translate([181,6])
//        rotate([0,0,90])
//            hbrett_kurz();
//    translate([272,6])
//        rotate([0,0,90])
//            hbrett_kurz(); 
//    translate([363,142])
//        rotate([0,0,90])
//        mirror([1,0,0])
//            vbrett_innen_mitte();
//    translate([90,146])
//        rotate([0,0,90])
//        vbrett_innen_bottom();
//    translate([363,146])
//        rotate([0,0,90])
//        vbrett_innen_bottom();
//}
